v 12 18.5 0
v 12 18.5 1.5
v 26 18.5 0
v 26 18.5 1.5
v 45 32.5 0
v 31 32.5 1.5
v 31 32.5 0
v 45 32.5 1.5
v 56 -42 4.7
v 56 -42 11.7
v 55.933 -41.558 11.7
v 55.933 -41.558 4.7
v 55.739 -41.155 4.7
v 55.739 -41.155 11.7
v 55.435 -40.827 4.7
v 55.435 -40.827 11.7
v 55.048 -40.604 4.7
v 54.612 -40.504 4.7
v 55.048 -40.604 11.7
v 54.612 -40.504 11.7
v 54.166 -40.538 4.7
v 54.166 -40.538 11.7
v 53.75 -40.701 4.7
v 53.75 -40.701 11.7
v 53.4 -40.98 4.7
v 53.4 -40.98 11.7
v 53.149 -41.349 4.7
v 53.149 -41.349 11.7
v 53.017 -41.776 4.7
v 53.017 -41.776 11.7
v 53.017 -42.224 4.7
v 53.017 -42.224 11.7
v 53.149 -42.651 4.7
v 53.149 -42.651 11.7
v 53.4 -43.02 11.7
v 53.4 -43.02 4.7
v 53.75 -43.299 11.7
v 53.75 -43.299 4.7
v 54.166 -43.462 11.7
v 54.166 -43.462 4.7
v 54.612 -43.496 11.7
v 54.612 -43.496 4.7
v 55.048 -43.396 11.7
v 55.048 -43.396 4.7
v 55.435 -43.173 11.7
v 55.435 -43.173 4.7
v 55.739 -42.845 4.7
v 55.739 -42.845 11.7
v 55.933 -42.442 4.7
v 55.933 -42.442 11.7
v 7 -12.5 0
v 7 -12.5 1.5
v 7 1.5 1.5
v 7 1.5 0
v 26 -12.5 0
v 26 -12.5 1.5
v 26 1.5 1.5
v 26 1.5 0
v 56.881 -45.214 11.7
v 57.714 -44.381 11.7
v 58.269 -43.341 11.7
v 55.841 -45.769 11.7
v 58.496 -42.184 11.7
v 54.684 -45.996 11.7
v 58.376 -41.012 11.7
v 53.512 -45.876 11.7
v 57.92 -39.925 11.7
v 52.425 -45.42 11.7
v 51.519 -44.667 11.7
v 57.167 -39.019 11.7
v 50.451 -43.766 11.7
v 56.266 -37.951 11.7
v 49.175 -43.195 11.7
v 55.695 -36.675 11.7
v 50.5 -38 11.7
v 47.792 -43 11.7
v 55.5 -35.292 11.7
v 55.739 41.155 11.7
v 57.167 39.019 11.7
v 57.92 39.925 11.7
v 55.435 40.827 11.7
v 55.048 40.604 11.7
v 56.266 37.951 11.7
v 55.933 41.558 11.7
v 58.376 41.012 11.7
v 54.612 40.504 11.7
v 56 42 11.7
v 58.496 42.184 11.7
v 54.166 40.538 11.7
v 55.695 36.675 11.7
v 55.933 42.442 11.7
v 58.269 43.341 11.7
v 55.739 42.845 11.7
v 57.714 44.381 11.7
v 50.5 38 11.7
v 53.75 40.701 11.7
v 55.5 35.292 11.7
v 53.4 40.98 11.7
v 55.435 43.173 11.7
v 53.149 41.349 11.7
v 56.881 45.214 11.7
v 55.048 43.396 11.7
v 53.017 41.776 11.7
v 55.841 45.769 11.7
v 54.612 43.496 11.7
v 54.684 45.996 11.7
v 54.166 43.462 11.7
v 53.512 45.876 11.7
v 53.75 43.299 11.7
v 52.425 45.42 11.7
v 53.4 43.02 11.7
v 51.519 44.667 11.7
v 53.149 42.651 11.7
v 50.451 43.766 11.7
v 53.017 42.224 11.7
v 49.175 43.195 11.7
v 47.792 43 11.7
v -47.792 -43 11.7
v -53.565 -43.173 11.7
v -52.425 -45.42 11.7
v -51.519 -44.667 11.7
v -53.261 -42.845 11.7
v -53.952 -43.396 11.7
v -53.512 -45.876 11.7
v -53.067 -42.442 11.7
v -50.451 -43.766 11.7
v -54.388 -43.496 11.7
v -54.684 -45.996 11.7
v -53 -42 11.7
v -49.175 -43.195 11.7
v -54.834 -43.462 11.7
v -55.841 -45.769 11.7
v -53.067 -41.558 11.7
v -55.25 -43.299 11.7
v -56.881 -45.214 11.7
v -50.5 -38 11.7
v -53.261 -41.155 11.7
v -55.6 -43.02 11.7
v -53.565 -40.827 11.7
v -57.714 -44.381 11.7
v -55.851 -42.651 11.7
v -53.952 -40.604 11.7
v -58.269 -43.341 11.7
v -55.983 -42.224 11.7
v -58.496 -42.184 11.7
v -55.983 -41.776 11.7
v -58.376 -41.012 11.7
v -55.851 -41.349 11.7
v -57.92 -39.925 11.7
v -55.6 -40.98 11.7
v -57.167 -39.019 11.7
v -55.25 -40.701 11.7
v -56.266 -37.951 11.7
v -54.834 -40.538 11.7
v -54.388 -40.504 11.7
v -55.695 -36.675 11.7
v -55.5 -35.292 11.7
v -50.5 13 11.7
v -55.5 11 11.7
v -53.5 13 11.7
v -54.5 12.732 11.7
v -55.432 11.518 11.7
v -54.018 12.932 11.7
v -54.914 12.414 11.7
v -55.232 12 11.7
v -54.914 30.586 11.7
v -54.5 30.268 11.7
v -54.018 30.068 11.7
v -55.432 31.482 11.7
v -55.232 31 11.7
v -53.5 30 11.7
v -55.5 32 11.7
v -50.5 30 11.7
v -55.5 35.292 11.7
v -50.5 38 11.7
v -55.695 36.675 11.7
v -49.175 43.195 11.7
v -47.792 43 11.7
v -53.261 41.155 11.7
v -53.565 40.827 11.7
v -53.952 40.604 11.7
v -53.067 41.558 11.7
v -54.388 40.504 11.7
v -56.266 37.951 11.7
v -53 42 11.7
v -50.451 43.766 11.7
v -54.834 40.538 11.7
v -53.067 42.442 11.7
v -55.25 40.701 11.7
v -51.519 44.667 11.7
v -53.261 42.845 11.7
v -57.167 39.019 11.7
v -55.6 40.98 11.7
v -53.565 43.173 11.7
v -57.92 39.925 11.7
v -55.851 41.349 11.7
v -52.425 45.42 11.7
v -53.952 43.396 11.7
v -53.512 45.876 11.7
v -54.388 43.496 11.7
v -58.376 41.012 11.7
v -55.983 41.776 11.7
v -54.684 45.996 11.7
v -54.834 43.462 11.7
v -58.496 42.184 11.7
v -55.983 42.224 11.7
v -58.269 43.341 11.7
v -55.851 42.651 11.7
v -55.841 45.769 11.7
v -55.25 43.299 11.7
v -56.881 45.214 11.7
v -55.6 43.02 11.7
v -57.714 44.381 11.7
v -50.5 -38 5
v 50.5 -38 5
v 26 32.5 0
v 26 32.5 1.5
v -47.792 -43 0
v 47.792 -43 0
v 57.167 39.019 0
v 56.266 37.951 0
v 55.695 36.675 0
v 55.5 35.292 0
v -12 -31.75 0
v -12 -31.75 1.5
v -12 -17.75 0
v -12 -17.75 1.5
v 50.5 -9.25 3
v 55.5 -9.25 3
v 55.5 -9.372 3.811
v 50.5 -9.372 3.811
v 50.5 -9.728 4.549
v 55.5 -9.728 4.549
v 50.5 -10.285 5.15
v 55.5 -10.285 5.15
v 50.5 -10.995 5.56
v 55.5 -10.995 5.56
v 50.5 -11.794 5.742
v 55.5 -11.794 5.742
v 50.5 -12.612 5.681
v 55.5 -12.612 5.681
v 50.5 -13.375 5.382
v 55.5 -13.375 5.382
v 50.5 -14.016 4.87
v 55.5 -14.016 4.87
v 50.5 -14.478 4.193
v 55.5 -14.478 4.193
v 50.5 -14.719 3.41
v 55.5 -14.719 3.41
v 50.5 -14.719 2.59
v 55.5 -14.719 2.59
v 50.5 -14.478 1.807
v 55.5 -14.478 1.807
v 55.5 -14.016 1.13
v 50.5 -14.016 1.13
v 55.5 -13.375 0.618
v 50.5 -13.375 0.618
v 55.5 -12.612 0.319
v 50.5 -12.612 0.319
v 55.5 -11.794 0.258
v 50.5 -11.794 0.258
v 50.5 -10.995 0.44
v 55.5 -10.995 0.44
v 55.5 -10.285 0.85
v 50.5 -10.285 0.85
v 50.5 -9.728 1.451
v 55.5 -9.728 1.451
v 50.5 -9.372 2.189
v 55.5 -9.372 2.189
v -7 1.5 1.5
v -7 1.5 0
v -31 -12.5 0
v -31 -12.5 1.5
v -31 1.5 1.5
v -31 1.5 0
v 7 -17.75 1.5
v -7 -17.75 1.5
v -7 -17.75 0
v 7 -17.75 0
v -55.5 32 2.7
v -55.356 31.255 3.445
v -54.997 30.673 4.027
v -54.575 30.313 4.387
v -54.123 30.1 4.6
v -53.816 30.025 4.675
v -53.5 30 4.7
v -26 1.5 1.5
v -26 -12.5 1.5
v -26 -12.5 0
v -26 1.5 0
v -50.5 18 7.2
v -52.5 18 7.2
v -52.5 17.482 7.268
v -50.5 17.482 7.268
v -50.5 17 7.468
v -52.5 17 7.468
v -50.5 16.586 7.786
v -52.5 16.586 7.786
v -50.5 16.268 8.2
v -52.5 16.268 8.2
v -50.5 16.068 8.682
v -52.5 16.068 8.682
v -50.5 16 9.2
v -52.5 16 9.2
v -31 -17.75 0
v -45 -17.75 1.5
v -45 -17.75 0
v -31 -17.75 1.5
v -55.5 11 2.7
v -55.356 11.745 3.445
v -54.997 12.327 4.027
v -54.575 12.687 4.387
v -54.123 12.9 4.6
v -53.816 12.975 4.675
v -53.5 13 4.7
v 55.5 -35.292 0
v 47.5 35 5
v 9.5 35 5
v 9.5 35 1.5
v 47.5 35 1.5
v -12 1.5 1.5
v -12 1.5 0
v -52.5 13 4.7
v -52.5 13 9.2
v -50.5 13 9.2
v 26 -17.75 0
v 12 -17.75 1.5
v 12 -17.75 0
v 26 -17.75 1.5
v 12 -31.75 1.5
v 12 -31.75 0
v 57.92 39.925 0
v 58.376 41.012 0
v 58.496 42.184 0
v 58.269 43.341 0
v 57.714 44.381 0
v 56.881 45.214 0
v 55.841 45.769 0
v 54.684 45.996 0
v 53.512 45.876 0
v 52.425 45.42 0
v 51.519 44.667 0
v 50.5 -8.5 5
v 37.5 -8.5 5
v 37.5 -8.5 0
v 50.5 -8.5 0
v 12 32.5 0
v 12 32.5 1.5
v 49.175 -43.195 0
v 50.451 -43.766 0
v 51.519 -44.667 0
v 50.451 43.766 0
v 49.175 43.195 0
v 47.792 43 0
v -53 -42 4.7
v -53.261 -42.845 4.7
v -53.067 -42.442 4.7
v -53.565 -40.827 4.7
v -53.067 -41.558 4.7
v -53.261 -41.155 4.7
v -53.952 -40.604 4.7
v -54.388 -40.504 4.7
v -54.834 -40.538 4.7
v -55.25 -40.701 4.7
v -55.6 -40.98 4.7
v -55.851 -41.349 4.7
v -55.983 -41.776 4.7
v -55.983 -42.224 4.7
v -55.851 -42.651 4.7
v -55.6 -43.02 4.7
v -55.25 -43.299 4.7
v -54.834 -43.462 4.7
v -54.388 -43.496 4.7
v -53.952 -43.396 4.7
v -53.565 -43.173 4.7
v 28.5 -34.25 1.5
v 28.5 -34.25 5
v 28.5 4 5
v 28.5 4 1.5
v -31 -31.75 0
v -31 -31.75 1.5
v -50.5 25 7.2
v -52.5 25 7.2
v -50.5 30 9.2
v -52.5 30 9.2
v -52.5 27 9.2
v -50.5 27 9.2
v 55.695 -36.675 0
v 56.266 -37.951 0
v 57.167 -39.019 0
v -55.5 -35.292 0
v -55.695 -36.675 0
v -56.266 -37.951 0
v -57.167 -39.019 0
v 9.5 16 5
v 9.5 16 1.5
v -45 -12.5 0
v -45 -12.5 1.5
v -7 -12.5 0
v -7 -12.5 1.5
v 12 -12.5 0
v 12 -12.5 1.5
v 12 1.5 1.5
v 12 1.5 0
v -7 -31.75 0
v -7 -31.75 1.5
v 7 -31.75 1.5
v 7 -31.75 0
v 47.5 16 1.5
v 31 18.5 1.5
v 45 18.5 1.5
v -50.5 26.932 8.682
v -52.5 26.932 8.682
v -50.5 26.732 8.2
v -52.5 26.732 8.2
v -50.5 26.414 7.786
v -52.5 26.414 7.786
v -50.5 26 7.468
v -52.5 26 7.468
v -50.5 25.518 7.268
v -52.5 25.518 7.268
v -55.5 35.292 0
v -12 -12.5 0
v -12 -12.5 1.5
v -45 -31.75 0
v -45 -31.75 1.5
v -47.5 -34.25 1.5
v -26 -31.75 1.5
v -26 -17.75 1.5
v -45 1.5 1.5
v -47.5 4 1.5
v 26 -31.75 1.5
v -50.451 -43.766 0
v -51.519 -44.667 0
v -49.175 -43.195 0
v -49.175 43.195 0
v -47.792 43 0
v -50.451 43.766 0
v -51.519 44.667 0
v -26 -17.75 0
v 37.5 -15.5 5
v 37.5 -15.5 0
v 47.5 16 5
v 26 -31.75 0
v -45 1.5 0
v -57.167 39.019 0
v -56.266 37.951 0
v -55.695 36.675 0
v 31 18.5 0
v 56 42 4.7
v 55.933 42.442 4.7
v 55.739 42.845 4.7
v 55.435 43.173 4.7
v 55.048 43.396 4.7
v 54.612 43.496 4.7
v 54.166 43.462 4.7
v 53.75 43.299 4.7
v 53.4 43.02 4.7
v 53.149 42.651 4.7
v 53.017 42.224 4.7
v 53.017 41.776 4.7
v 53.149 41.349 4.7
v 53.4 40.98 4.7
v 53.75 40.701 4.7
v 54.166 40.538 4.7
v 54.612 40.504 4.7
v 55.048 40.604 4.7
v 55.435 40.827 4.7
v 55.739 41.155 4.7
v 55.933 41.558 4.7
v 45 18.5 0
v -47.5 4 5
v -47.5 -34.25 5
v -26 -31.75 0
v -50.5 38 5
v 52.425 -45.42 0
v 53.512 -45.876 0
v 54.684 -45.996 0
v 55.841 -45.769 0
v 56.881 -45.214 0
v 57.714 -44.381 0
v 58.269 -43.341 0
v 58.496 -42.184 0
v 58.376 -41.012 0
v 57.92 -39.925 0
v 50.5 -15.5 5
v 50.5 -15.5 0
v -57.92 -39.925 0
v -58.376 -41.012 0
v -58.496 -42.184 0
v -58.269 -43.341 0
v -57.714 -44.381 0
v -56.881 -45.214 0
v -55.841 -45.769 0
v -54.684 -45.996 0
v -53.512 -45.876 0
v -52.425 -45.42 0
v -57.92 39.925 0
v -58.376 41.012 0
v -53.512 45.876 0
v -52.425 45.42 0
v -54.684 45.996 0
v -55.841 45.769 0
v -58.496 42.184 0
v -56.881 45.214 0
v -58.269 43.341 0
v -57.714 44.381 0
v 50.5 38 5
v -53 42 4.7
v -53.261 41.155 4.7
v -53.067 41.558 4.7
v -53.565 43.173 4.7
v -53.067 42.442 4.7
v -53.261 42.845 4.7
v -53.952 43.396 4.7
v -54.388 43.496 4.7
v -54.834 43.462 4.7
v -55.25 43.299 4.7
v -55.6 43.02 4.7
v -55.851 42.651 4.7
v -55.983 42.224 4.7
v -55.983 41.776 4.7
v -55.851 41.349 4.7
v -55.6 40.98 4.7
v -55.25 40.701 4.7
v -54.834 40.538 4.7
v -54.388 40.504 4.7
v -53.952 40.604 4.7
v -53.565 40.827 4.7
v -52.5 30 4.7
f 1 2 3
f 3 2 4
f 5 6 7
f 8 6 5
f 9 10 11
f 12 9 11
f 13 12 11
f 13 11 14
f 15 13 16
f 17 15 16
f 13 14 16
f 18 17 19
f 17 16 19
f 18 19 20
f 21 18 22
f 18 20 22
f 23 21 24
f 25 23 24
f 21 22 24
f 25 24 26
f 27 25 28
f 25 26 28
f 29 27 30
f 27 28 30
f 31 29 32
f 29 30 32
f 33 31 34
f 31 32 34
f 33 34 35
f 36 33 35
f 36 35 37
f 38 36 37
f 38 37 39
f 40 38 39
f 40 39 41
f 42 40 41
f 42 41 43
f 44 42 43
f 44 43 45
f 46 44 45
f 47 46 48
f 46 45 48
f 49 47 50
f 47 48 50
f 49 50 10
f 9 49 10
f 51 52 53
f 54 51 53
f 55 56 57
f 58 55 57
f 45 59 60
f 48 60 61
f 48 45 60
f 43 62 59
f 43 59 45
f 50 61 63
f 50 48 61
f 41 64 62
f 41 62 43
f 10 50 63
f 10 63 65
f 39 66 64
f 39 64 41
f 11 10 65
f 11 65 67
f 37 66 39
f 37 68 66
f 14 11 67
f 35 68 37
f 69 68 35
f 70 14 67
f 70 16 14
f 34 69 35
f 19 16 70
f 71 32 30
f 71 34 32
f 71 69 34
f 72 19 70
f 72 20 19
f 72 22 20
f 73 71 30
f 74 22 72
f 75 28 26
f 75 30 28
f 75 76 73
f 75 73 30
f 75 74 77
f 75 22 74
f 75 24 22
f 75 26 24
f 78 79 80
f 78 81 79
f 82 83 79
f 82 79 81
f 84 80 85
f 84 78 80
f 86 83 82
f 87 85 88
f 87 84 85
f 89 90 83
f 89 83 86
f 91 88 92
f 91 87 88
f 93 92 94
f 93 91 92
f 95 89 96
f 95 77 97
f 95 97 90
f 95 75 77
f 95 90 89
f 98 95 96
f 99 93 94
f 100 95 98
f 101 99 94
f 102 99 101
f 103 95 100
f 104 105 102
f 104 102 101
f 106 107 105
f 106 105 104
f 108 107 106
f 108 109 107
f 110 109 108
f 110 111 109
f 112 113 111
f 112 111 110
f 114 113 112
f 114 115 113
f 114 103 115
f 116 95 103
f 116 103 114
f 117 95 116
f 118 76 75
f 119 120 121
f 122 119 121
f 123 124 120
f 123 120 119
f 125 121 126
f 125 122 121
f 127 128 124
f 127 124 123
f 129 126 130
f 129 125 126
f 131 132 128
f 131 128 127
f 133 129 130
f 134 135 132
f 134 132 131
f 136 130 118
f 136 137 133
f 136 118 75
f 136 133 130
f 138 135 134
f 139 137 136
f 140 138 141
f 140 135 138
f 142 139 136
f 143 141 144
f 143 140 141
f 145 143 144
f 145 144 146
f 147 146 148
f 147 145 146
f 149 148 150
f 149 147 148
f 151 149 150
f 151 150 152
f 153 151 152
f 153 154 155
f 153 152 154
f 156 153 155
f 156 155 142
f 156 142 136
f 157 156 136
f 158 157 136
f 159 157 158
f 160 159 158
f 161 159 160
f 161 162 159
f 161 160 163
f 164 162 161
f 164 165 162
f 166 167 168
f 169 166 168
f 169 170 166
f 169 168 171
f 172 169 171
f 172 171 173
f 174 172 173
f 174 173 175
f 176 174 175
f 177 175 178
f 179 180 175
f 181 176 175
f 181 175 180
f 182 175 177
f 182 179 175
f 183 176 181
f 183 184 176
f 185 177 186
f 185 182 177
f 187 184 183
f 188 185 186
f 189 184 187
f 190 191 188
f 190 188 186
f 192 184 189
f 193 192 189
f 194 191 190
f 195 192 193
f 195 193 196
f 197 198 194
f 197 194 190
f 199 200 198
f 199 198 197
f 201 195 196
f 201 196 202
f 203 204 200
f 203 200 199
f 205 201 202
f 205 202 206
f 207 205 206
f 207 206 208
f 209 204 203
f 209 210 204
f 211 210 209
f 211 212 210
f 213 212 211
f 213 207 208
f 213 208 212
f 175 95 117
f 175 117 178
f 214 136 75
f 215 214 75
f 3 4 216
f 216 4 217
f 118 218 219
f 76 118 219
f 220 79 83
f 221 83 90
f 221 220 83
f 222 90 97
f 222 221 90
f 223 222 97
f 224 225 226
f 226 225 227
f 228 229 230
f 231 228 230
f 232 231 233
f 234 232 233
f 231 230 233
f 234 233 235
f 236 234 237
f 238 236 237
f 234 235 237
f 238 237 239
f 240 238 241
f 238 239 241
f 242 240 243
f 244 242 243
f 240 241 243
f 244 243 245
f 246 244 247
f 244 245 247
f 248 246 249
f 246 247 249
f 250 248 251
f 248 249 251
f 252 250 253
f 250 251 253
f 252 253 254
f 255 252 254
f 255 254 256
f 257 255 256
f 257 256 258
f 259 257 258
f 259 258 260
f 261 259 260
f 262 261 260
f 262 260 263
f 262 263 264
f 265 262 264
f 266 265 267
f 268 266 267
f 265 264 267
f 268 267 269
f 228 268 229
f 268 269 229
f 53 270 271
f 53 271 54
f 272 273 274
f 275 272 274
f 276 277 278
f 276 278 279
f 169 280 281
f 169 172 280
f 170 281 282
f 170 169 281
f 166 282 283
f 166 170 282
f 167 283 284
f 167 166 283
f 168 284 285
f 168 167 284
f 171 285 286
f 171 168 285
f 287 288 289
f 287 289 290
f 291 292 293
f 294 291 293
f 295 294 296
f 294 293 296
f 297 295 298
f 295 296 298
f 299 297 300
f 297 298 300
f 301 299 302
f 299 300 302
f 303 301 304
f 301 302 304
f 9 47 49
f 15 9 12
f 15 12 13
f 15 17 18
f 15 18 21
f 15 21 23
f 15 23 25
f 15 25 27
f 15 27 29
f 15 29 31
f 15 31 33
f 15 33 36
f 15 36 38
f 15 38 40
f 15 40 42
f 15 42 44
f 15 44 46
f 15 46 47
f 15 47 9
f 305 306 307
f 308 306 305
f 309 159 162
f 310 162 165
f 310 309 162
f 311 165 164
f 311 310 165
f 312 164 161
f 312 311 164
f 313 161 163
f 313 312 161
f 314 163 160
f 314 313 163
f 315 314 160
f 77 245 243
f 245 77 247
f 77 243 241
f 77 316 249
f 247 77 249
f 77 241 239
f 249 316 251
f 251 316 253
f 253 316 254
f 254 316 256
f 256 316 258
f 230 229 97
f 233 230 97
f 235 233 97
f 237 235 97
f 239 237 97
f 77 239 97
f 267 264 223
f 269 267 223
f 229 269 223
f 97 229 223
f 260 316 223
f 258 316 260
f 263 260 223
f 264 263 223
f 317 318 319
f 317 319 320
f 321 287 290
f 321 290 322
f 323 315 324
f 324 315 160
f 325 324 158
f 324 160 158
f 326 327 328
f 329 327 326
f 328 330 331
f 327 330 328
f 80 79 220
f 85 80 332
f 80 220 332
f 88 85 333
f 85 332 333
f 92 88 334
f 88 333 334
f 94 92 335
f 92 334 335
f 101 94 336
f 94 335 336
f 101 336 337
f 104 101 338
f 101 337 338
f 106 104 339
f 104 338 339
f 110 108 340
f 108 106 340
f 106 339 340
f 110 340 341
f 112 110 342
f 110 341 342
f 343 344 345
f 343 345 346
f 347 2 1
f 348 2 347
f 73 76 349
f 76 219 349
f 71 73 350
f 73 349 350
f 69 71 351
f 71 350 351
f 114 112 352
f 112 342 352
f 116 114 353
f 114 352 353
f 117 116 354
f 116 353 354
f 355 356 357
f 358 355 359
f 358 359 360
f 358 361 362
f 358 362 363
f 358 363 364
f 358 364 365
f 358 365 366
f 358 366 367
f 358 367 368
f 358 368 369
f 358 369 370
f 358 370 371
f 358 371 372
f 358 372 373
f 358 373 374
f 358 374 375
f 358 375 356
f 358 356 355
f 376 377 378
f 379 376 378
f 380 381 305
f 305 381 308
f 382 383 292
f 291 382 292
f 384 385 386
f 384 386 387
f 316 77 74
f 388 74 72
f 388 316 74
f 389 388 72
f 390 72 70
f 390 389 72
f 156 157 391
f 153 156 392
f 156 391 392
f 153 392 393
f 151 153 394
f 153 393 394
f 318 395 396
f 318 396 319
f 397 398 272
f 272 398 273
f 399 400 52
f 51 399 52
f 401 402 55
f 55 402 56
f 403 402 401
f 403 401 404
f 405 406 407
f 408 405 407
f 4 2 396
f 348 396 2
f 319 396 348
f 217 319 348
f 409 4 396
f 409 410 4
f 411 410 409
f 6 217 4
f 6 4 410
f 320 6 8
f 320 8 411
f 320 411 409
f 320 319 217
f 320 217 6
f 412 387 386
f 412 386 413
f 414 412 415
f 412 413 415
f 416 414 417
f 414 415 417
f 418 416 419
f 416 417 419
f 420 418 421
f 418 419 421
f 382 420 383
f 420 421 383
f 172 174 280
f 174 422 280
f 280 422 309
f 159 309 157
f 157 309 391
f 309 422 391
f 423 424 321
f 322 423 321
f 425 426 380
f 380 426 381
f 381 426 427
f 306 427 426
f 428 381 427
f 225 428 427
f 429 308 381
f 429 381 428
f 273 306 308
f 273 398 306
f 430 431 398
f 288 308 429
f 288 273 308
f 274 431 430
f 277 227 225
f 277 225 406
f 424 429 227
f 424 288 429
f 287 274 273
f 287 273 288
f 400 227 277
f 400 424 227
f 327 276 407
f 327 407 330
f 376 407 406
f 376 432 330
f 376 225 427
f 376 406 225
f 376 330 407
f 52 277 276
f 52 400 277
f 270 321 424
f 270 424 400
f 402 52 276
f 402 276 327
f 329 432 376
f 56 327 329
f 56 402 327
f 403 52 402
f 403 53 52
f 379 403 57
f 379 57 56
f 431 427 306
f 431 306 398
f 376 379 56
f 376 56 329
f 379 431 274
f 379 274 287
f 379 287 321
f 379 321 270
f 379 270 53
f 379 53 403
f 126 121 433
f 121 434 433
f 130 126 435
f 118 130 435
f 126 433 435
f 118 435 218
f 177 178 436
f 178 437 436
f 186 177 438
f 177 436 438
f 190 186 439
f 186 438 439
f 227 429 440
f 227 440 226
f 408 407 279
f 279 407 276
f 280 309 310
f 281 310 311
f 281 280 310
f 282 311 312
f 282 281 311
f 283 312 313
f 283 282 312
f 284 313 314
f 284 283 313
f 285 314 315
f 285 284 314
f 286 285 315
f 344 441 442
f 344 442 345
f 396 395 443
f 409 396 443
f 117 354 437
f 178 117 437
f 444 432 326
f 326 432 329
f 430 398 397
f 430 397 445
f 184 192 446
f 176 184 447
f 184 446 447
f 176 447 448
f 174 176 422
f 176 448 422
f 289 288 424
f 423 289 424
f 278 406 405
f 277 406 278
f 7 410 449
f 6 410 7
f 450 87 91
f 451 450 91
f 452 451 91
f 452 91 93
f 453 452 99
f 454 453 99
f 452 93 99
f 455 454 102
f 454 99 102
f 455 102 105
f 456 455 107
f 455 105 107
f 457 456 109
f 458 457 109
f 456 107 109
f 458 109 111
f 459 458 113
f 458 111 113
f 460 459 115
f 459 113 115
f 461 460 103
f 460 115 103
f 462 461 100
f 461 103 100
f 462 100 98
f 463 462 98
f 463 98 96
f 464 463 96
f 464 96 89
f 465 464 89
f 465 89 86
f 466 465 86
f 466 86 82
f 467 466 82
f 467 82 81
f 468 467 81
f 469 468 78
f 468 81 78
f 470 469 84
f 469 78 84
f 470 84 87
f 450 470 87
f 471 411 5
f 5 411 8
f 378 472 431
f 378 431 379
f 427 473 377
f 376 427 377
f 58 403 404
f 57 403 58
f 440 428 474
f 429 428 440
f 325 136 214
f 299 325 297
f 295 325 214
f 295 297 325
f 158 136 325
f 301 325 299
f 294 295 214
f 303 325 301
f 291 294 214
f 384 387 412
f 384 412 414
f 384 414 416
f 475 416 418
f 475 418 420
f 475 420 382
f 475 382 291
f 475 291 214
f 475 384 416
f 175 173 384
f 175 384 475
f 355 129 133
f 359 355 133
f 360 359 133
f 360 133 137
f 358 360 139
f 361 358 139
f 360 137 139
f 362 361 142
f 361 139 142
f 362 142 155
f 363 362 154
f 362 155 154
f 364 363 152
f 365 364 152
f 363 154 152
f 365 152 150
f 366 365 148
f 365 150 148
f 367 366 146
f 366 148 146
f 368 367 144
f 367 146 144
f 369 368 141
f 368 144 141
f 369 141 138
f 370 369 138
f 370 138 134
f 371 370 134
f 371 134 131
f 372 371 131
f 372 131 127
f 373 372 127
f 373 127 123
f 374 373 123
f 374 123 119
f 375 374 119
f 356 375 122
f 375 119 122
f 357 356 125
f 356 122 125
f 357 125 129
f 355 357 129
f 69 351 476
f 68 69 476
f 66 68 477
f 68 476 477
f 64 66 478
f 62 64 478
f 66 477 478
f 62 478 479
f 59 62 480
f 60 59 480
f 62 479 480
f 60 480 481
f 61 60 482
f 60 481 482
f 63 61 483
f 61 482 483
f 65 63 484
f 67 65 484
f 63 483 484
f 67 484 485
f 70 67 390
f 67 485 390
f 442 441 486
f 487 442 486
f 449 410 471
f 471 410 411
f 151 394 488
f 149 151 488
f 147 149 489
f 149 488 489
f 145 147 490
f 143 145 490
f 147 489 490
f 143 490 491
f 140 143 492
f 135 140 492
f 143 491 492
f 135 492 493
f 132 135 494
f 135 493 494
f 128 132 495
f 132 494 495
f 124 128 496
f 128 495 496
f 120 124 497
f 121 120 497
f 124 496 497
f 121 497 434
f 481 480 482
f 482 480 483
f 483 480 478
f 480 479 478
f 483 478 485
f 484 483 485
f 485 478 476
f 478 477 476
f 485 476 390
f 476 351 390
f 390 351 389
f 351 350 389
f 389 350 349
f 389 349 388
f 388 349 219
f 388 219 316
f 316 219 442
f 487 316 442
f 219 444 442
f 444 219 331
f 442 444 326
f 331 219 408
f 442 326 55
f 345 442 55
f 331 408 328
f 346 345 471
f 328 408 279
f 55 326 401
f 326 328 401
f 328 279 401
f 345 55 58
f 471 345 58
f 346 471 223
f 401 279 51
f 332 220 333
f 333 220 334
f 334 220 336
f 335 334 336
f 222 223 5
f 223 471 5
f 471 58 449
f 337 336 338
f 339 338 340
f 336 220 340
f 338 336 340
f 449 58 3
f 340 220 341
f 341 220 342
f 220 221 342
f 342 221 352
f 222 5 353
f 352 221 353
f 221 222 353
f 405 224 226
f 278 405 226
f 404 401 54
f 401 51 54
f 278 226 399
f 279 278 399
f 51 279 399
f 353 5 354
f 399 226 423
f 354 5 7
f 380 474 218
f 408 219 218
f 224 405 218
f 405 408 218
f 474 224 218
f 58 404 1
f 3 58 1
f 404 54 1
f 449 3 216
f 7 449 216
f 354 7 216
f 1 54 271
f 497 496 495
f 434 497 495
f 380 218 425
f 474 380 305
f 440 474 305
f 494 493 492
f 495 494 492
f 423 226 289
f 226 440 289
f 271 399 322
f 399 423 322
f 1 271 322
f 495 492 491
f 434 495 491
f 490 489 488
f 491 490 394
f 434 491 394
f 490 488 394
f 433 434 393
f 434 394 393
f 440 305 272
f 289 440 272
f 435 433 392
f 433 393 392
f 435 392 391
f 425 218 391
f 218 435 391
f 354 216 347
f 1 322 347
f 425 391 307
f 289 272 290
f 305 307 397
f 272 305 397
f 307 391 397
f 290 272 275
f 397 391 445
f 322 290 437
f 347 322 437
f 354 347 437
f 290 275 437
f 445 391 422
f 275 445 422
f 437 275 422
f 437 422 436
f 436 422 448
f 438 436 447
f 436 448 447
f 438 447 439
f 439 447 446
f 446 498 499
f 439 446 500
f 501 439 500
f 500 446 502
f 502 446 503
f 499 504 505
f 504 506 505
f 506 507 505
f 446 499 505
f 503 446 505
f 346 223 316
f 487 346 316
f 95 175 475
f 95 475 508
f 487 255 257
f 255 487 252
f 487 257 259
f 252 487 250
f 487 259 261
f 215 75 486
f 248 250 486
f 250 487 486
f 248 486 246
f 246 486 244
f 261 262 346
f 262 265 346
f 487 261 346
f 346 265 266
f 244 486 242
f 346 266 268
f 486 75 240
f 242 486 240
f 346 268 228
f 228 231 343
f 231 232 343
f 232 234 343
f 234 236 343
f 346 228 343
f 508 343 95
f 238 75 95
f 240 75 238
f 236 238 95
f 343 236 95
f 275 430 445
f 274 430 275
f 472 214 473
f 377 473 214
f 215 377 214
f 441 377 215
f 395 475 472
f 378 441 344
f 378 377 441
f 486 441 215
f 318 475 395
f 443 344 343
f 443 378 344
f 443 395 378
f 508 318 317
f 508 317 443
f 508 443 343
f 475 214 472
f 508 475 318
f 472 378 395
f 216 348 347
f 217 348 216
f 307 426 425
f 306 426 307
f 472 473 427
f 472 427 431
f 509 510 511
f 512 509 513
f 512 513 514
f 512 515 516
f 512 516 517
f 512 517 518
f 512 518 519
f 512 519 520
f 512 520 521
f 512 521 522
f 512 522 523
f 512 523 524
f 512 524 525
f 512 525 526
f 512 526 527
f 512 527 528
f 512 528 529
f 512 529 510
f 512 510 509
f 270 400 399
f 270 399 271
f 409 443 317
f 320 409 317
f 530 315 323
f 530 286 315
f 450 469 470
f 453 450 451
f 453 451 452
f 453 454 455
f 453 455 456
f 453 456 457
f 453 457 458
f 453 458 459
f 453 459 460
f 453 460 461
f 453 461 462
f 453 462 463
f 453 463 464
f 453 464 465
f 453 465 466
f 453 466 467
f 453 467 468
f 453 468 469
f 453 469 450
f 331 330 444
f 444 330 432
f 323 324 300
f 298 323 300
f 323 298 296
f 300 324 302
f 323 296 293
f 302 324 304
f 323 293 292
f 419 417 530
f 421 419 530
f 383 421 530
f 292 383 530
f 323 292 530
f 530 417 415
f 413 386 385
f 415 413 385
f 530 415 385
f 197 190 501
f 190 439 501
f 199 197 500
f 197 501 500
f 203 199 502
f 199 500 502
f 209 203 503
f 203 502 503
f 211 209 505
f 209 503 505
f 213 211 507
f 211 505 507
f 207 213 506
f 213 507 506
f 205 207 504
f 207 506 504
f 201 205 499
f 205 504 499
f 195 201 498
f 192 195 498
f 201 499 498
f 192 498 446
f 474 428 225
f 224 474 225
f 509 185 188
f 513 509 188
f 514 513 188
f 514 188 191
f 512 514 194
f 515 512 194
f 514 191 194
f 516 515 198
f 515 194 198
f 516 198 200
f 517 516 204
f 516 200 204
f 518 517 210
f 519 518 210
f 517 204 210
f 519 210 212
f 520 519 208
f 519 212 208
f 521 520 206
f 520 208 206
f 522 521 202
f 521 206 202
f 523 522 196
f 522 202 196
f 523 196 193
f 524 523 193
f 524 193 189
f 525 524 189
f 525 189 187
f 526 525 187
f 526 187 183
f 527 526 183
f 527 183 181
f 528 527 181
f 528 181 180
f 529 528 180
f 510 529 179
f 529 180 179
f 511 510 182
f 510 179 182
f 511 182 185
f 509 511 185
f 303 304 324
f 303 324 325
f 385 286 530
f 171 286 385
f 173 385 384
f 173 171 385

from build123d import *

# Parameters (mm, degrees)
PAD004_DEPTH     = 11.7
SHAPEBINDER001_R = 4
PAD005_DEPTH     = 11.7
SKETCH008_R      = 1.5
POCKET004_DEPTH  = 7
FILLET002_R      = 5
SKETCH009_W      = 101
SKETCH009_H      = 76
POCKET005_DEPTH  = 6.7
SKETCH011_W      = 76
SKETCH011_H      = 38.25
SKETCH011_W_2    = 38
SKETCH011_H_2    = 19
POCKET006_DEPTH  = 3.5
SKETCH012_W      = 14
SKETCH012_H      = 14
POCKET007_DEPTH  = 1.5
SKETCH015_W      = 13
SKETCH015_H      = 7
POCKET010_DEPTH  = 5
SKETCH016_R      = 2.75
POCKET011_DEPTH  = 5
SKETCH017_W      = 5
SKETCH017_H      = 17
POCKET012_DEPTH  = 2.5
SKETCH018_W      = 3
SKETCH018_H      = 17
POCKET013_DEPTH  = 4.5
POCKET014_DEPTH  = 2
FILLET003_R      = 2


with BuildPart() as part:
    # ShapeBinder → Pad004 (new body)
    with BuildSketch(Plane(origin=(0, 0, 0), x_dir=(0, 1, 0), z_dir=(0, 0, 1))):
        with BuildLine():
            Line((43, -51.5), (43, 51.5))
            ThreePointArc((43, 51.5), (41.828427, 54.328427), (39, 55.5))
            Line((39, 55.5), (-39, 55.5))
            ThreePointArc((-39, 55.5), (-41.828427, 54.328427), (-43, 51.5))
            Line((-43, 51.5), (-43, -51.5))
            ThreePointArc((-43, -51.5), (-41.828427, -54.328427), (-39, -55.5))
            Line((-39, -55.5), (39, -55.5))
            ThreePointArc((39, -55.5), (41.828427, -54.328427), (43, -51.5))
        make_face()
    extrude(amount=PAD004_DEPTH)

    # ShapeBinder001 → Pad005 (join)
    with BuildSketch(Plane(origin=(0, 0, 0), x_dir=(0, 1, 0), z_dir=(0, 0, 1))):
        with Locations((42, -54.5)):
            Circle(SHAPEBINDER001_R)
        with Locations((42, 54.5)):
            Circle(SHAPEBINDER001_R)
        with Locations((-42, -54.5)):
            Circle(SHAPEBINDER001_R)
        with Locations((-42, 54.5)):
            Circle(SHAPEBINDER001_R)
    extrude(amount=PAD005_DEPTH)

    # Sketch008 (on Face8 of Pad005) → Pocket004 (cut)
    with BuildSketch(Plane.XY.offset(11.7)):
        with Locations((54.5, 42)):
            Circle(SKETCH008_R)
        with Locations((-54.5, 42)):
            Circle(SKETCH008_R)
        with Locations((-54.5, -42)):
            Circle(SKETCH008_R)
        with Locations((54.5, -42)):
            Circle(SKETCH008_R)
    extrude(amount=-POCKET004_DEPTH, mode=Mode.SUBTRACT)

    # Fillet002
    fillet002_edges = [part.edges().sort_by_distance(p)[0] for p in [
        (-55.5, -38.127017, 5.85),
        (-55.5, 38.127017, 5.85),
        (50.627017, 43, 5.85),
        (-50.627017, 43, 5.85),
        (55.5, -38.127017, 5.85),
        (55.5, 38.127017, 5.85),
        (-50.627017, -43, 5.85),
        (50.627017, -43, 5.85),
    ]]
    fillet(fillet002_edges, radius=FILLET002_R)

    # Sketch009 (on Face5 of Fillet002) → Pocket005 (cut)
    with BuildSketch(Plane.XY.offset(11.7)):
        Rectangle(SKETCH009_W, SKETCH009_H)
    extrude(amount=-POCKET005_DEPTH, mode=Mode.SUBTRACT)

    # Sketch011 (on Face30 of Pocket005) → Pocket006 (cut)
    with BuildSketch(Plane.XY.offset(5)):
        with Locations((-9.5, -15.125)):
            Rectangle(SKETCH011_W, SKETCH011_H)
        with Locations((28.5, 25.5)):
            Rectangle(SKETCH011_W_2, SKETCH011_H_2)
    extrude(amount=-POCKET006_DEPTH, mode=Mode.SUBTRACT)

    # Sketch012 (on Face40 of Pocket006) → Pocket007 (cut)
    with BuildSketch(Plane.XY.offset(1.5)):
        with Locations((-38, -5.5)):
            Rectangle(SKETCH012_W, SKETCH012_H)
        with Locations((-19, -5.5)):
            Rectangle(SKETCH012_W, SKETCH012_H)
        with Locations((0, -5.5)):
            Rectangle(SKETCH012_W, SKETCH012_H)
        with Locations((19, -5.5)):
            Rectangle(SKETCH012_W, SKETCH012_H)
        with Locations((-38, -24.75)):
            Rectangle(SKETCH012_W, SKETCH012_H)
        with Locations((-19, -24.75)):
            Rectangle(SKETCH012_W, SKETCH012_H)
        with Locations((0, -24.75)):
            Rectangle(SKETCH012_W, SKETCH012_H)
        with Locations((19, -24.75)):
            Rectangle(SKETCH012_W, SKETCH012_H)
        with Locations((19, 25.5)):
            Rectangle(SKETCH012_W, SKETCH012_H)
        with Locations((38, 25.5)):
            Rectangle(SKETCH012_W, SKETCH012_H)
    extrude(amount=-POCKET007_DEPTH, mode=Mode.SUBTRACT)

    # Sketch015 → Pocket010 (cut)
    with BuildSketch(Plane.XY.offset(5)):
        with Locations((44, -12)):
            Rectangle(SKETCH015_W, SKETCH015_H)
    extrude(amount=-POCKET010_DEPTH, mode=Mode.SUBTRACT)

    # Sketch016 (on Face1 of Pocket010) → Pocket011 (cut)
    with BuildSketch(Plane.YZ.offset(55.5)):
        with Locations((-12, 3)):
            Circle(SKETCH016_R)
    extrude(amount=-POCKET011_DEPTH, mode=Mode.SUBTRACT)

    # Sketch017 (on Face5 of Pocket007) → Pocket012 (cut)
    with BuildSketch(Plane.XY.offset(11.7)):
        with Locations((-53, 21.5)):
            Rectangle(SKETCH017_W, SKETCH017_H)
    extrude(amount=-POCKET012_DEPTH, mode=Mode.SUBTRACT)

    # Sketch018 (on Face73 of Pocket012) → Pocket013 (cut)
    with BuildSketch(Plane.XY.offset(9.2)):
        with Locations((-54, 21.5)):
            Rectangle(SKETCH018_W, SKETCH018_H)
    extrude(amount=-POCKET013_DEPTH, mode=Mode.SUBTRACT)

    # Sketch019 (on Face80 of Pocket013) → Pocket014 (cut)
    with BuildSketch(Plane(origin=(-52.5, 0, 0), x_dir=(0, -1, 0), z_dir=(-1, 0, 0))):
        with BuildLine():
            ThreePointArc((-25, 11.2), (-27, 9.2), (-25, 7.2))
            Line((-25, 7.2), (-18, 7.2))
            ThreePointArc((-18, 7.2), (-16, 9.2), (-18, 11.2))
            Line((-25, 11.2), (-18, 11.2))
        make_face()
    extrude(amount=-POCKET014_DEPTH, mode=Mode.SUBTRACT)

    # Fillet003
    fillet003_edges = [part.edges().sort_by_distance(p)[0] for p in [
        (-55.5, 21.5, 4.7),
        (-55.5, 30, 8.2),
        (-55.5, 13, 8.2),
    ]]
    fillet(fillet003_edges, radius=FILLET003_R)


solid = part.part
